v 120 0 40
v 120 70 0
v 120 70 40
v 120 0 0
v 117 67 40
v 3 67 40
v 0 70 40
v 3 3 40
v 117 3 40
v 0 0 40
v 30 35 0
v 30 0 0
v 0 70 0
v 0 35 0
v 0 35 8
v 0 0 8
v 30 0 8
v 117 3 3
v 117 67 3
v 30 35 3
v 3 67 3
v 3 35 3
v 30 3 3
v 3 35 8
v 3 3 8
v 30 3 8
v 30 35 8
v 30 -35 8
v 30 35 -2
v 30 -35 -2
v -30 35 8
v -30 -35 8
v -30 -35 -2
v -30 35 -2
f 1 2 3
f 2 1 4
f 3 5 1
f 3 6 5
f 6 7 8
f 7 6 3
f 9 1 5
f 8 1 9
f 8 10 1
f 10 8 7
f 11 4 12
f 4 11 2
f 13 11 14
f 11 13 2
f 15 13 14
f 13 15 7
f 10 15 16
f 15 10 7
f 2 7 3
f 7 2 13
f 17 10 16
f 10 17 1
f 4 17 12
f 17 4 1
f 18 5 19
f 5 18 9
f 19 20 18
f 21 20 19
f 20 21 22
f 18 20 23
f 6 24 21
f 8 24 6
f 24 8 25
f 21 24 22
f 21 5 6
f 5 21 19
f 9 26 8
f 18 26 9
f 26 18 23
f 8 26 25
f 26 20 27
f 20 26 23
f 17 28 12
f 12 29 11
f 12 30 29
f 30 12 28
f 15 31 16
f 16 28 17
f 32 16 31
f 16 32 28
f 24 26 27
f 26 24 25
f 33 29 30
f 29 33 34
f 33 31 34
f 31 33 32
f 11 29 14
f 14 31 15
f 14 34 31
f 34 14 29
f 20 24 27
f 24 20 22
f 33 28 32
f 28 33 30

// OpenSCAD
// Dimensions in millimetres
outer_x = 120;
outer_y = 70;
outer_z = 40;

wall_thickness = 3;
floor_thickness = 3;

platform_length = 60;
platform_width = outer_y;  // spans full Y
platform_height_above_floor = 10;  // top at z = 13 (floor at z = 3, so 10 mm above)

hole_diameter = 2;
hole_radius = hole_diameter / 2;
hole_z = 30;  // z-level of hole center
hole_y = 0;   // along Y=0 (end wall)

// The tank must rest on the XY plane at z = 0, so we shift everything up by 20 mm
// because currently the lowest point is at z = -20.00 (from report)
// We want the floor to be at z = 0, so we translate the whole model up by 20 mm

// Adjusted z for platform top: should be at z = 13 (10 mm above floor at z = 3)
// So platform top is at z = 13, floor at z = 3, so platform is 10 mm high

// Inner dimensions (after subtracting walls)
inner_x = outer_x - 2 * wall_thickness;
inner_y = outer_y - 2 * wall_thickness;
inner_z = outer_z - floor_thickness;

// Platform top at z = 13 (floor at z = 3, so 10 mm above)
platform_top_z = 13;

// Platform centered in X
platform_x_start = (outer_x - platform_length) / 2;
platform_x_end = platform_x_start + platform_length;

// Create the main tank body (open top, hollow), centered at origin but shifted so z = 0 is floor
module tank() {
    difference() {
        // Outer box (with floor), now shifted so floor is at z = 0
        translate([0, 0, 20]) {
            cube([outer_x, outer_y, outer_z], center = false);
        }
        // Remove inner cavity (also shifted to z = 0)
        translate([0, 0, 20 - outer_z/2 + inner_z/2]) {
            cube([inner_x, inner_y, inner_z], center = false);
        }
    }
}

// Create the raised platform (solid, centered in X, full Y), at z = 13
module platform() {
    translate([0, 0, 13]) {
        cube([platform_length, platform_width, wall_thickness], center = true);
    }
}

// Create the two end-wall holes (horizontal, along X, at y=0, z=30)
// The hole is a cylinder along X, so we rotate it to align with X-axis
module end_hole() {
    // Cylinder along X-axis, centered at origin, length = wall_thickness + 1 to ensure cut
    cylinder(r = hole_radius, h = wall_thickness + 1, $fn = 64, center = true);
}

// Place a hole at a given X position (on the end wall), at y=0, z=30
module hole_at_end(x_pos) {
    // Translate to the end wall (x_pos), at y=0, z=30
    // Then rotate to align cylinder along X-axis (so it's horizontal)
    translate([x_pos, 0, 30]) {
        rotate([90, 0, 0]) {
            end_hole();
        }
    }
}

// Main assembly: shift everything so the floor is at z = 0
// We'll build the whole model with z = 0 at the bottom
$fn = 64;

// Build the tank with platform and holes, all shifted so z = 0 is the floor
// We do this by translating the entire model up by 20 mm (since original was centered at z = 0)
// But instead, we build everything from the start with z = 0 at the floor

// Recompute: we want the floor at z = 0, so the original cube was from z = -20 to z = 20 (size 40), so we shift up by 20
// So we'll build the whole thing with a common translation of +20 in Z

// We'll build the tank and platform with a common translation
// But to avoid confusion, we'll build everything relative to z = 0 at the floor

// New approach: build everything with z = 0 at the floor

// Tank body: from z = 0 to z = 40, with walls and floor
// The inner cavity is from z = 3 to z = 40 (since floor is 3 mm thick), so we remove a cavity from z = 3 to z = 40

module tank() {
    difference() {
        // Outer box: from z = 0 to z = 40
        cube([outer_x, outer_y, outer_z], center = false);
        // Inner cavity: from z = 3 to z = 40, and x,y offset by wall_thickness
        translate([wall_thickness, wall_thickness, 3]) {
            cube([inner_x, inner_y, outer_z - 3], center = false);
        }
    }
}

// Platform: from z = 3 to z = 13 (since floor at z = 3, platform top at z = 13)
// So platform is 10 mm high
module platform() {
    translate([0, 0, 3]) {
        cube([platform_length, platform_width, 10], center = true);
    }
}

// End holes: horizontal, at z = 30, y = 0, through the end walls at X = ±(outer_x/2 - wall_thickness)
// The hole is a cylinder of diameter 2 mm, length slightly longer than wall thickness to ensure cut
// We'll place it at the end wall (x = ±(outer_x/2 - wall_thickness)), at y = 0, z = 30
// But the hole is horizontal, so we need to align the cylinder along X

module hole_at_end(x_pos) {
    // Place cylinder at the end wall (x = x_pos), at y = 0, z = 30
    // Rotate to align cylinder along X-axis (so it's horizontal)
    translate([x_pos, 0, 30]) {
        rotate([90, 0, 0]) {
            cylinder(r = hole_radius, h = wall_thickness + 1, $fn = 64, center = true);
        }
    }
}

// Main assembly: build the tank, add the platform, then subtract the holes
// We do this in one union to ensure solid is watertight

union() {
    tank();
    platform();
}

// Now subtract the two end holes (through the end walls)
difference() {
    // Start with the unioned body (tank + platform)
    union() {
        tank();
        platform();
    }

    // Subtract the left hole (at x = outer_x/2 - wall_thickness)
    hole_at_end(outer_x/2 - wall_thickness);

    // Subtract the right hole (at x = -outer_x/2 + wall_thickness)
    hole_at_end(-outer_x/2 + wall_thickness);
}
